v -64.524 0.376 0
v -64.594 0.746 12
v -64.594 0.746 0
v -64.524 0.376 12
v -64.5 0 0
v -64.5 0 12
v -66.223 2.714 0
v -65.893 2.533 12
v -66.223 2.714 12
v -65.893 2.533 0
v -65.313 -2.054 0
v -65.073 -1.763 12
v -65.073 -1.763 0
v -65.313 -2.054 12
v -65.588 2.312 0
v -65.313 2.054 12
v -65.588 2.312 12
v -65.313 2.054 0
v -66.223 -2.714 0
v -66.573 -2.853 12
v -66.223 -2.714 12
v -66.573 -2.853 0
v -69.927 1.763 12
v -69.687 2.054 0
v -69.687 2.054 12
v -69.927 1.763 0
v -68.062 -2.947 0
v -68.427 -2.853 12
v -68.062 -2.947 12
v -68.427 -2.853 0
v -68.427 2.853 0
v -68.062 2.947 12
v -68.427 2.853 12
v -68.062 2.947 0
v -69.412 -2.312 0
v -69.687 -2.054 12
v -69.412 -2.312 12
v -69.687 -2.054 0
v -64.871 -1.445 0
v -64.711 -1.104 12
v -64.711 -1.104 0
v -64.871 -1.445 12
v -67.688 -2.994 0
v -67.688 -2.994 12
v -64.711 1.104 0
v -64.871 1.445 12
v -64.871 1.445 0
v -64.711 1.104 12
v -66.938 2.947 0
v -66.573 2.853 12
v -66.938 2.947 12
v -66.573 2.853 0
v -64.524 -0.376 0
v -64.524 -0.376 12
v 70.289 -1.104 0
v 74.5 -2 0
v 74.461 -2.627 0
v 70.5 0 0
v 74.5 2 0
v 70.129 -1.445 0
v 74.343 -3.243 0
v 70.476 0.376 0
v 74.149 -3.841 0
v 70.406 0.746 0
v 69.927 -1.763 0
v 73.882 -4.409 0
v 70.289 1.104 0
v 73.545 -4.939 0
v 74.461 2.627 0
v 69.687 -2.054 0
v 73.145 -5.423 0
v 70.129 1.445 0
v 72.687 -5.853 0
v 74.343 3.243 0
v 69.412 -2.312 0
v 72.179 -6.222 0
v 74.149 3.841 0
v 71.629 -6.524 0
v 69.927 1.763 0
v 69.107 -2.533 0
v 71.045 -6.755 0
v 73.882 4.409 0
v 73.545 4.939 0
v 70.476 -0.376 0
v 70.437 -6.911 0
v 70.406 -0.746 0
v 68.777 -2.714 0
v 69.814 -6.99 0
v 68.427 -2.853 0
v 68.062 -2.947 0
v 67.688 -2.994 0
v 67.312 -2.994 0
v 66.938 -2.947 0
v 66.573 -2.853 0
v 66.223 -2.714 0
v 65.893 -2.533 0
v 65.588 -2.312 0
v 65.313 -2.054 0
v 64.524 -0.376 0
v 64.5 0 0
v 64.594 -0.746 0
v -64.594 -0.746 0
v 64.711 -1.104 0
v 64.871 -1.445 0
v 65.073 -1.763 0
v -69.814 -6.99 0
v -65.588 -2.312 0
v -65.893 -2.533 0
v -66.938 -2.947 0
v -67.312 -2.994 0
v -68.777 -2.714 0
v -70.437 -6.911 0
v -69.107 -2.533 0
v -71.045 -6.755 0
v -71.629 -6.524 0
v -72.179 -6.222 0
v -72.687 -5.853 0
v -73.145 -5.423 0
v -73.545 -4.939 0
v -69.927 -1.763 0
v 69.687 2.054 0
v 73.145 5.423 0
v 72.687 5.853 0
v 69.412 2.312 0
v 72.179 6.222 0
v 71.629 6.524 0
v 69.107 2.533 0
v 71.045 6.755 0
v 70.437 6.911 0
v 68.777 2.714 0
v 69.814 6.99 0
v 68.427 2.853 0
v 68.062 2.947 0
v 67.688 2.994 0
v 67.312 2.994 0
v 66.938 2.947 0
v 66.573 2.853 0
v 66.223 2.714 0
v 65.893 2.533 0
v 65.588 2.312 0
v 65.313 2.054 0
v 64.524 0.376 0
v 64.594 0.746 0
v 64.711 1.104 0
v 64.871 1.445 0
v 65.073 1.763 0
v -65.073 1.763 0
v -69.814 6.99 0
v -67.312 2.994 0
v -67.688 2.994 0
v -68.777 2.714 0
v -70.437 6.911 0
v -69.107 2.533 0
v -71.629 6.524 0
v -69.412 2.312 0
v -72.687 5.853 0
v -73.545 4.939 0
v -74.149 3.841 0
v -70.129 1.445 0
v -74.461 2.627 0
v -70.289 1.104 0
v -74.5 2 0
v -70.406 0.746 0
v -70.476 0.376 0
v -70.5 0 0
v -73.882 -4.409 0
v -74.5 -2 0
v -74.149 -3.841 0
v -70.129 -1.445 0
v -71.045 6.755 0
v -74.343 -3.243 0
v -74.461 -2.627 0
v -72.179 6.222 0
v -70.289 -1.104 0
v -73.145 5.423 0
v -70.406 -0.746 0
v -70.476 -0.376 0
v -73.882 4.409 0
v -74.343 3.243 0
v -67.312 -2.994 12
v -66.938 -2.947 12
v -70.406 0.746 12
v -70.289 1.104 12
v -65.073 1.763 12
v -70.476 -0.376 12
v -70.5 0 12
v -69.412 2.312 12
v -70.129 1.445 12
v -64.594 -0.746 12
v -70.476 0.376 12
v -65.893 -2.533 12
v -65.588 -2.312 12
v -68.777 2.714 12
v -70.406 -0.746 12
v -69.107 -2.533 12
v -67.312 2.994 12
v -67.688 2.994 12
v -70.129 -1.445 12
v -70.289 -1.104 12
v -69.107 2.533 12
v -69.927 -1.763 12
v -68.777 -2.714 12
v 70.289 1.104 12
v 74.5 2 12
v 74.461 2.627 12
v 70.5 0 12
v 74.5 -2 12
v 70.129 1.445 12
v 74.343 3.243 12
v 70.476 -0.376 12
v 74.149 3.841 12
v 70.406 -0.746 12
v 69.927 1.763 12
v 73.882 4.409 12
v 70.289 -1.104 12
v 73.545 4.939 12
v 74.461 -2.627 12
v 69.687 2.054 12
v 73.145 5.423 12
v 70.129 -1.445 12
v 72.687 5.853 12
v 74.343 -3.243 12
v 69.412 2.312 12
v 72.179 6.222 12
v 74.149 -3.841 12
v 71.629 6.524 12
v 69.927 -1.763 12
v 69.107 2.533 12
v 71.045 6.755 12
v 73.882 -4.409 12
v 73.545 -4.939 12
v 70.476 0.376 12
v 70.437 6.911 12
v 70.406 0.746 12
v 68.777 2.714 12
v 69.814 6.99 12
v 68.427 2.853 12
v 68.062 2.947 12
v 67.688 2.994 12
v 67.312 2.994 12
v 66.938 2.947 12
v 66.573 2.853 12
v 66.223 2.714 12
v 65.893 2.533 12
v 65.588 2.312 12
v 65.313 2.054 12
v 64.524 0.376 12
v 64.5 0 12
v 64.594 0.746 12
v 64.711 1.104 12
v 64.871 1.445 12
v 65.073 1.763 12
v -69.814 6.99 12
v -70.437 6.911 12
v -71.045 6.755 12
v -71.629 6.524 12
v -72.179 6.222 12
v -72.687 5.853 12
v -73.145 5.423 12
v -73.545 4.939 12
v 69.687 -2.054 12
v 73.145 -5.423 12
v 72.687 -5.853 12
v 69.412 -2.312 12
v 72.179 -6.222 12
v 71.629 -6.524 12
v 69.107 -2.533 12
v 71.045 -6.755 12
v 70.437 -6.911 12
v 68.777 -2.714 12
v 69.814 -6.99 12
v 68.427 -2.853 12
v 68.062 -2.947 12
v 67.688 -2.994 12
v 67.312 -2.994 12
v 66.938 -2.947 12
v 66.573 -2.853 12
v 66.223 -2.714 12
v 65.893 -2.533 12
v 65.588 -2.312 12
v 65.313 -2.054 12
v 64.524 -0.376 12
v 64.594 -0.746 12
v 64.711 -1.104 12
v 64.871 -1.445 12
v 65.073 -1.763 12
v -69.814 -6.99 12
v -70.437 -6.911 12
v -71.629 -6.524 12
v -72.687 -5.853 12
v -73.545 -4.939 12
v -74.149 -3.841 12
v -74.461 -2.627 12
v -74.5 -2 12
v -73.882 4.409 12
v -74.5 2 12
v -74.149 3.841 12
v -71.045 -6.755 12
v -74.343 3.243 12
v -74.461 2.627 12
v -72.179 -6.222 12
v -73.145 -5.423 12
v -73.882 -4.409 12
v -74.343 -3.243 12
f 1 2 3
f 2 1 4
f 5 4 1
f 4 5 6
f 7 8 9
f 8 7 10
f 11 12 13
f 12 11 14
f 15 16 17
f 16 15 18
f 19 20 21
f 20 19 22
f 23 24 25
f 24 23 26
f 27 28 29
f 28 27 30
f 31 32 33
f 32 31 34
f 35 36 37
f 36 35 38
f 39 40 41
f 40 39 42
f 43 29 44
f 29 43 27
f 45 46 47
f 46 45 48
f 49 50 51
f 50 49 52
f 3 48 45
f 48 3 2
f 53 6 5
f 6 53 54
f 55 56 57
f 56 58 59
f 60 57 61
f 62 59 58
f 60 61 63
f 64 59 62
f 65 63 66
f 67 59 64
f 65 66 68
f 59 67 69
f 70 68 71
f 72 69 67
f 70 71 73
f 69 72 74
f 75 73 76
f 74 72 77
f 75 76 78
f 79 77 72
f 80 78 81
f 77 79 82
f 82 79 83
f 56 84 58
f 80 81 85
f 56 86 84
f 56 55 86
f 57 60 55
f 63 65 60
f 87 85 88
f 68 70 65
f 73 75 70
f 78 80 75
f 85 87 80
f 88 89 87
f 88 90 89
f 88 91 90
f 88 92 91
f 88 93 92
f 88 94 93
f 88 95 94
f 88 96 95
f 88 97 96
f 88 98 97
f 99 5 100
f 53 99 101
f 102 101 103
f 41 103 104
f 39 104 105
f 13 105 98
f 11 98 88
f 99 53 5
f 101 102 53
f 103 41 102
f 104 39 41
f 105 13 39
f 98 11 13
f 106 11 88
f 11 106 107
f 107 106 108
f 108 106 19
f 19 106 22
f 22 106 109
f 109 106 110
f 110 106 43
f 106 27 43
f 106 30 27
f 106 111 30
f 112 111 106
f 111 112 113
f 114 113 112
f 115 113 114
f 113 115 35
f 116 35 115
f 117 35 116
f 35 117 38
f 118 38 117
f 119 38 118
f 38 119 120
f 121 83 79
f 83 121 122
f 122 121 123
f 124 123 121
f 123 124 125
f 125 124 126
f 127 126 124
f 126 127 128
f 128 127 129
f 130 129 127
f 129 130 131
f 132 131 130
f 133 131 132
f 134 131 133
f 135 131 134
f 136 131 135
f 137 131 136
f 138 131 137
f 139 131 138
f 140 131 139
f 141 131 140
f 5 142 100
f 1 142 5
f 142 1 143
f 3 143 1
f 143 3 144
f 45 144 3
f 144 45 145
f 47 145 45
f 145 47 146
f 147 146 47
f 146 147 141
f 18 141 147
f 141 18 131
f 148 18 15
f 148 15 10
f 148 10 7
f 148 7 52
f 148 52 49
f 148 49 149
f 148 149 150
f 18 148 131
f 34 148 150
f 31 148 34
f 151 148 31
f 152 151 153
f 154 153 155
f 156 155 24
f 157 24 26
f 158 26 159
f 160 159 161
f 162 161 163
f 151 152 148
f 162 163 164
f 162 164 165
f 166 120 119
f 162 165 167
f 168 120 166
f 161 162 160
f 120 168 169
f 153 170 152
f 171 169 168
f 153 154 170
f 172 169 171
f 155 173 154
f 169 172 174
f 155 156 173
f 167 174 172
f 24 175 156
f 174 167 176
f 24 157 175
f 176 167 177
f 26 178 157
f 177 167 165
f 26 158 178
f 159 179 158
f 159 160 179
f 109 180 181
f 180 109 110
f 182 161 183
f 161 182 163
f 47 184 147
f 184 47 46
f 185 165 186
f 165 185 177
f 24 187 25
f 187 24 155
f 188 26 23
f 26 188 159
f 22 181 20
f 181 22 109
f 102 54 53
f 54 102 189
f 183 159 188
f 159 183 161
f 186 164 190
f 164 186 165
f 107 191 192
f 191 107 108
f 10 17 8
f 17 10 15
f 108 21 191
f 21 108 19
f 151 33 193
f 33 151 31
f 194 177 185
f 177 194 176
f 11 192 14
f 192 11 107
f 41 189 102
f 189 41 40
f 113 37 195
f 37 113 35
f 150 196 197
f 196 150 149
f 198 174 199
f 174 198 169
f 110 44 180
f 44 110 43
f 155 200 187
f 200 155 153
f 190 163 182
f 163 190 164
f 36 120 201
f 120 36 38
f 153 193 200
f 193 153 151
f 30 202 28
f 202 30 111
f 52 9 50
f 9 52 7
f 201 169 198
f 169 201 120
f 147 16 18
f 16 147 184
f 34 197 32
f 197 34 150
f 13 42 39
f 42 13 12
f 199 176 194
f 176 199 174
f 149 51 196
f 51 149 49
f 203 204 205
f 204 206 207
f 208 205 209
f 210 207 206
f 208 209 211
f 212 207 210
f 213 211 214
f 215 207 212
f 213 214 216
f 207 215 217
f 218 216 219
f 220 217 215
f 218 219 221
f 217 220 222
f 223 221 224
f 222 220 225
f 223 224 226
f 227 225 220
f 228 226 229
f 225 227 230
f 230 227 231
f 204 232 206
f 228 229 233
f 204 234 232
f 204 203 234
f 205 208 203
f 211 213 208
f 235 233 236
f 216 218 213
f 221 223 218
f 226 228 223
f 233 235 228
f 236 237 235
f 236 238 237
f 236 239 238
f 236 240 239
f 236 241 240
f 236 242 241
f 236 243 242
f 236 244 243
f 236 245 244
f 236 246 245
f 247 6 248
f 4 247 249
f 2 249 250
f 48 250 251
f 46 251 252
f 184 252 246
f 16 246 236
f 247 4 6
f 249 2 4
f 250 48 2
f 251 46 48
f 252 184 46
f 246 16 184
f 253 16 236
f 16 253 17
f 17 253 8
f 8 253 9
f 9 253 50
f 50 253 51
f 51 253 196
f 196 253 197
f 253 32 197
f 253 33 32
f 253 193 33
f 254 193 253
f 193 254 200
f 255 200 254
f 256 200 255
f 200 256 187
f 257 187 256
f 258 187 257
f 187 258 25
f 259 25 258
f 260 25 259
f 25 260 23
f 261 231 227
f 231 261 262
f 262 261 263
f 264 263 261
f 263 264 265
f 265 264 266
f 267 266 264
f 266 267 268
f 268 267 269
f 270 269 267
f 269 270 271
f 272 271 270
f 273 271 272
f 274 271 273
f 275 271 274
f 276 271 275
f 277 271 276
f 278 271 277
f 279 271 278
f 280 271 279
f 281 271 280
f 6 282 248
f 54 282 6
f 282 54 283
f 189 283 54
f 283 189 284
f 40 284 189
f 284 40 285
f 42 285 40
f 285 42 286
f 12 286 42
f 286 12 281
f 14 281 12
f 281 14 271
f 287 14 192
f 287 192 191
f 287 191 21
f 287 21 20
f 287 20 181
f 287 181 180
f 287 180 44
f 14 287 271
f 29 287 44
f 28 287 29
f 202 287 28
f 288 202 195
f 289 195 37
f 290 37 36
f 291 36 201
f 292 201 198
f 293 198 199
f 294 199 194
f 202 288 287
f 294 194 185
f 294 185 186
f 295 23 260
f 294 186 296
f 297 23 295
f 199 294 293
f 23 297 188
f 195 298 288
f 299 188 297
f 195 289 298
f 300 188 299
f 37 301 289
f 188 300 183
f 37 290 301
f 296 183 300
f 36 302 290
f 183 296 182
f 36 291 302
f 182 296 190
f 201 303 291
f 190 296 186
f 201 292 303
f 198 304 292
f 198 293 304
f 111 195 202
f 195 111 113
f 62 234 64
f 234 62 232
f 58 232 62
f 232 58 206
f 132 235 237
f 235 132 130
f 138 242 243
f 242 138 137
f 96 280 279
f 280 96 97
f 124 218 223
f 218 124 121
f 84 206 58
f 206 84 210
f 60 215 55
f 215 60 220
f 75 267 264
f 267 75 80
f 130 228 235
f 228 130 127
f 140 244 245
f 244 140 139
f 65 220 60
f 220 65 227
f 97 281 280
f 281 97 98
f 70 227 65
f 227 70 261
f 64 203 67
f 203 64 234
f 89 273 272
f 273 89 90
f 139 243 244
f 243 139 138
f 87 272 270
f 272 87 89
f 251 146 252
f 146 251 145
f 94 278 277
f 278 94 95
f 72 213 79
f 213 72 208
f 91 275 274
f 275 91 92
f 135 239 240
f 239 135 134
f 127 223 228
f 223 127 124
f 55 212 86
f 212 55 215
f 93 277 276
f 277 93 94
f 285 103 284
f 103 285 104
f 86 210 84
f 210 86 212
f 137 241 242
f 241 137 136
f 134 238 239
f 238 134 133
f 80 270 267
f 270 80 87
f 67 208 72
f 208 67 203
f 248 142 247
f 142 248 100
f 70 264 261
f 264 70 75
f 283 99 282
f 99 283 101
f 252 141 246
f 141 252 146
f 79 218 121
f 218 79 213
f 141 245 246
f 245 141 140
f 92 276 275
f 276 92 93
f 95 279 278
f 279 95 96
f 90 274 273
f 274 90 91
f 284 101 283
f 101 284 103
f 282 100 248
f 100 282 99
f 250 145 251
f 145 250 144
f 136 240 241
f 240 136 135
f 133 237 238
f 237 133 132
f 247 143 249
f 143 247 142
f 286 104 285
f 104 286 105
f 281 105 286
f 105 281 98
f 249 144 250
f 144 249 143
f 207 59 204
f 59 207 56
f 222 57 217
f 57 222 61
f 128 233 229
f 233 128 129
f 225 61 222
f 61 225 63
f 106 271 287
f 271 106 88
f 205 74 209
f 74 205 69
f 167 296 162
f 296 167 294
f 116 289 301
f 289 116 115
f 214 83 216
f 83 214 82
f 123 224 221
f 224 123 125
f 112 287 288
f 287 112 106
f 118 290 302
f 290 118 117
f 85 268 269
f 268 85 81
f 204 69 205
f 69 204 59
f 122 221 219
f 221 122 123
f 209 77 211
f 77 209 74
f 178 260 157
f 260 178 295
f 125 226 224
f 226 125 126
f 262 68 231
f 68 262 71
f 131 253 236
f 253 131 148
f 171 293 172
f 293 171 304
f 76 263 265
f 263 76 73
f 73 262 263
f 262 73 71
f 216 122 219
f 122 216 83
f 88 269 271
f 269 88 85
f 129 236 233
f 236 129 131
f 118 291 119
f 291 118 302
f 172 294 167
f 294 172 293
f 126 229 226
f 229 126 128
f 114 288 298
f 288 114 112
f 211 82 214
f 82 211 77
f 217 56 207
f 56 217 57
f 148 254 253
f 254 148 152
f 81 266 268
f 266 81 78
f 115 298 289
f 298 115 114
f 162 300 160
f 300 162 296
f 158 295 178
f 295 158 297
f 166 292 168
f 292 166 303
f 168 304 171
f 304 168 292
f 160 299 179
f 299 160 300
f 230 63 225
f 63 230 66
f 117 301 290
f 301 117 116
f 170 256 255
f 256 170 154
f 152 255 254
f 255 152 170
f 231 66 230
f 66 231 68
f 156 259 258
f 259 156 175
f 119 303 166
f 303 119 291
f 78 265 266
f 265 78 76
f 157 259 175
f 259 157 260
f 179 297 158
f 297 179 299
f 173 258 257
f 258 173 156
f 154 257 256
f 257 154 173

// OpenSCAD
$fn = 50;


difference() {
	union() {
		hull() {
			translate(v = [-69.5000000000, 2.0000000000, 0]) {
				cylinder(h = 12, r = 5);
			}
			translate(v = [69.5000000000, 2.0000000000, 0]) {
				cylinder(h = 12, r = 5);
			}
			translate(v = [-69.5000000000, -2.0000000000, 0]) {
				cylinder(h = 12, r = 5);
			}
			translate(v = [69.5000000000, -2.0000000000, 0]) {
				cylinder(h = 12, r = 5);
			}
		}
	}
	union() {
		translate(v = [-67.5000000000, 0.0000000000, 0]) {
			cylinder(h = 12, r = 3.0000000000);
		}
		translate(v = [67.5000000000, 0.0000000000, 0]) {
			cylinder(h = 12, r = 3.0000000000);
		}
		translate(v = [-67.5000000000, 0.0000000000, 0]) {
			cylinder(h = 12, r = 1.5000000000);
		}
		translate(v = [67.5000000000, 0.0000000000, 0]) {
			cylinder(h = 12, r = 1.5000000000);
		}
		translate(v = [-67.5000000000, 0.0000000000, 0]) {
			cylinder(h = 12, r = 1.5000000000);
		}
		translate(v = [67.5000000000, 0.0000000000, 0]) {
			cylinder(h = 12, r = 1.5000000000);
		}
		translate(v = [-67.5000000000, 0.0000000000, 0]) {
			cylinder(h = 12, r = 1.5000000000);
		}
		translate(v = [67.5000000000, 0.0000000000, 0]) {
			cylinder(h = 12, r = 1.5000000000);
		}
	}
}
